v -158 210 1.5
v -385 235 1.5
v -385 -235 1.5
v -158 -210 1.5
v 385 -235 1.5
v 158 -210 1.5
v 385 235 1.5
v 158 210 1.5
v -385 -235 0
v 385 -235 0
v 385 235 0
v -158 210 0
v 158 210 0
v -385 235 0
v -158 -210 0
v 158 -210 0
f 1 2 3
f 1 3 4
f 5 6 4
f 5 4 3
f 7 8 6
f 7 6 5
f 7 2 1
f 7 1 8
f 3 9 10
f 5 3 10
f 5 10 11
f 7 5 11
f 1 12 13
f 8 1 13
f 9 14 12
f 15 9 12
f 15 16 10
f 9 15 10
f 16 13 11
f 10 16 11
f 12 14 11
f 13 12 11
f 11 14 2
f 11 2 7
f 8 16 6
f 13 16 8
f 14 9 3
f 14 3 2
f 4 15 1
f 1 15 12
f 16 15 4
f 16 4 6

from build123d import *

# Parameters (mm, degrees)
SKETCH1_W               = 770
SKETCH1_H               = 470
BOSS_EXTRUDE1_DEPTH     = 1.5
CUT_EXTRUDE4_DEPTH      = 17
CUT_EXTRUDE4_DEPTH_BACK = 10
SKETCH3_W               = 316
SKETCH3_H               = 420


with BuildPart() as part:
    # Sketch1 → Boss-Extrude1 (new body)
    with BuildSketch(Plane.XY):
        Rectangle(SKETCH1_W, SKETCH1_H)
    extrude(amount=BOSS_EXTRUDE1_DEPTH)

    # Sketch3 → Cut-Extrude4 (cut, two sides: drawn at the far end of the back side and taken through both)
    with BuildSketch(Plane.XY.offset(1.5).offset(-CUT_EXTRUDE4_DEPTH_BACK)):
        Rectangle(SKETCH3_W, SKETCH3_H)
    extrude(amount=CUT_EXTRUDE4_DEPTH + CUT_EXTRUDE4_DEPTH_BACK, mode=Mode.SUBTRACT)


solid = part.part
